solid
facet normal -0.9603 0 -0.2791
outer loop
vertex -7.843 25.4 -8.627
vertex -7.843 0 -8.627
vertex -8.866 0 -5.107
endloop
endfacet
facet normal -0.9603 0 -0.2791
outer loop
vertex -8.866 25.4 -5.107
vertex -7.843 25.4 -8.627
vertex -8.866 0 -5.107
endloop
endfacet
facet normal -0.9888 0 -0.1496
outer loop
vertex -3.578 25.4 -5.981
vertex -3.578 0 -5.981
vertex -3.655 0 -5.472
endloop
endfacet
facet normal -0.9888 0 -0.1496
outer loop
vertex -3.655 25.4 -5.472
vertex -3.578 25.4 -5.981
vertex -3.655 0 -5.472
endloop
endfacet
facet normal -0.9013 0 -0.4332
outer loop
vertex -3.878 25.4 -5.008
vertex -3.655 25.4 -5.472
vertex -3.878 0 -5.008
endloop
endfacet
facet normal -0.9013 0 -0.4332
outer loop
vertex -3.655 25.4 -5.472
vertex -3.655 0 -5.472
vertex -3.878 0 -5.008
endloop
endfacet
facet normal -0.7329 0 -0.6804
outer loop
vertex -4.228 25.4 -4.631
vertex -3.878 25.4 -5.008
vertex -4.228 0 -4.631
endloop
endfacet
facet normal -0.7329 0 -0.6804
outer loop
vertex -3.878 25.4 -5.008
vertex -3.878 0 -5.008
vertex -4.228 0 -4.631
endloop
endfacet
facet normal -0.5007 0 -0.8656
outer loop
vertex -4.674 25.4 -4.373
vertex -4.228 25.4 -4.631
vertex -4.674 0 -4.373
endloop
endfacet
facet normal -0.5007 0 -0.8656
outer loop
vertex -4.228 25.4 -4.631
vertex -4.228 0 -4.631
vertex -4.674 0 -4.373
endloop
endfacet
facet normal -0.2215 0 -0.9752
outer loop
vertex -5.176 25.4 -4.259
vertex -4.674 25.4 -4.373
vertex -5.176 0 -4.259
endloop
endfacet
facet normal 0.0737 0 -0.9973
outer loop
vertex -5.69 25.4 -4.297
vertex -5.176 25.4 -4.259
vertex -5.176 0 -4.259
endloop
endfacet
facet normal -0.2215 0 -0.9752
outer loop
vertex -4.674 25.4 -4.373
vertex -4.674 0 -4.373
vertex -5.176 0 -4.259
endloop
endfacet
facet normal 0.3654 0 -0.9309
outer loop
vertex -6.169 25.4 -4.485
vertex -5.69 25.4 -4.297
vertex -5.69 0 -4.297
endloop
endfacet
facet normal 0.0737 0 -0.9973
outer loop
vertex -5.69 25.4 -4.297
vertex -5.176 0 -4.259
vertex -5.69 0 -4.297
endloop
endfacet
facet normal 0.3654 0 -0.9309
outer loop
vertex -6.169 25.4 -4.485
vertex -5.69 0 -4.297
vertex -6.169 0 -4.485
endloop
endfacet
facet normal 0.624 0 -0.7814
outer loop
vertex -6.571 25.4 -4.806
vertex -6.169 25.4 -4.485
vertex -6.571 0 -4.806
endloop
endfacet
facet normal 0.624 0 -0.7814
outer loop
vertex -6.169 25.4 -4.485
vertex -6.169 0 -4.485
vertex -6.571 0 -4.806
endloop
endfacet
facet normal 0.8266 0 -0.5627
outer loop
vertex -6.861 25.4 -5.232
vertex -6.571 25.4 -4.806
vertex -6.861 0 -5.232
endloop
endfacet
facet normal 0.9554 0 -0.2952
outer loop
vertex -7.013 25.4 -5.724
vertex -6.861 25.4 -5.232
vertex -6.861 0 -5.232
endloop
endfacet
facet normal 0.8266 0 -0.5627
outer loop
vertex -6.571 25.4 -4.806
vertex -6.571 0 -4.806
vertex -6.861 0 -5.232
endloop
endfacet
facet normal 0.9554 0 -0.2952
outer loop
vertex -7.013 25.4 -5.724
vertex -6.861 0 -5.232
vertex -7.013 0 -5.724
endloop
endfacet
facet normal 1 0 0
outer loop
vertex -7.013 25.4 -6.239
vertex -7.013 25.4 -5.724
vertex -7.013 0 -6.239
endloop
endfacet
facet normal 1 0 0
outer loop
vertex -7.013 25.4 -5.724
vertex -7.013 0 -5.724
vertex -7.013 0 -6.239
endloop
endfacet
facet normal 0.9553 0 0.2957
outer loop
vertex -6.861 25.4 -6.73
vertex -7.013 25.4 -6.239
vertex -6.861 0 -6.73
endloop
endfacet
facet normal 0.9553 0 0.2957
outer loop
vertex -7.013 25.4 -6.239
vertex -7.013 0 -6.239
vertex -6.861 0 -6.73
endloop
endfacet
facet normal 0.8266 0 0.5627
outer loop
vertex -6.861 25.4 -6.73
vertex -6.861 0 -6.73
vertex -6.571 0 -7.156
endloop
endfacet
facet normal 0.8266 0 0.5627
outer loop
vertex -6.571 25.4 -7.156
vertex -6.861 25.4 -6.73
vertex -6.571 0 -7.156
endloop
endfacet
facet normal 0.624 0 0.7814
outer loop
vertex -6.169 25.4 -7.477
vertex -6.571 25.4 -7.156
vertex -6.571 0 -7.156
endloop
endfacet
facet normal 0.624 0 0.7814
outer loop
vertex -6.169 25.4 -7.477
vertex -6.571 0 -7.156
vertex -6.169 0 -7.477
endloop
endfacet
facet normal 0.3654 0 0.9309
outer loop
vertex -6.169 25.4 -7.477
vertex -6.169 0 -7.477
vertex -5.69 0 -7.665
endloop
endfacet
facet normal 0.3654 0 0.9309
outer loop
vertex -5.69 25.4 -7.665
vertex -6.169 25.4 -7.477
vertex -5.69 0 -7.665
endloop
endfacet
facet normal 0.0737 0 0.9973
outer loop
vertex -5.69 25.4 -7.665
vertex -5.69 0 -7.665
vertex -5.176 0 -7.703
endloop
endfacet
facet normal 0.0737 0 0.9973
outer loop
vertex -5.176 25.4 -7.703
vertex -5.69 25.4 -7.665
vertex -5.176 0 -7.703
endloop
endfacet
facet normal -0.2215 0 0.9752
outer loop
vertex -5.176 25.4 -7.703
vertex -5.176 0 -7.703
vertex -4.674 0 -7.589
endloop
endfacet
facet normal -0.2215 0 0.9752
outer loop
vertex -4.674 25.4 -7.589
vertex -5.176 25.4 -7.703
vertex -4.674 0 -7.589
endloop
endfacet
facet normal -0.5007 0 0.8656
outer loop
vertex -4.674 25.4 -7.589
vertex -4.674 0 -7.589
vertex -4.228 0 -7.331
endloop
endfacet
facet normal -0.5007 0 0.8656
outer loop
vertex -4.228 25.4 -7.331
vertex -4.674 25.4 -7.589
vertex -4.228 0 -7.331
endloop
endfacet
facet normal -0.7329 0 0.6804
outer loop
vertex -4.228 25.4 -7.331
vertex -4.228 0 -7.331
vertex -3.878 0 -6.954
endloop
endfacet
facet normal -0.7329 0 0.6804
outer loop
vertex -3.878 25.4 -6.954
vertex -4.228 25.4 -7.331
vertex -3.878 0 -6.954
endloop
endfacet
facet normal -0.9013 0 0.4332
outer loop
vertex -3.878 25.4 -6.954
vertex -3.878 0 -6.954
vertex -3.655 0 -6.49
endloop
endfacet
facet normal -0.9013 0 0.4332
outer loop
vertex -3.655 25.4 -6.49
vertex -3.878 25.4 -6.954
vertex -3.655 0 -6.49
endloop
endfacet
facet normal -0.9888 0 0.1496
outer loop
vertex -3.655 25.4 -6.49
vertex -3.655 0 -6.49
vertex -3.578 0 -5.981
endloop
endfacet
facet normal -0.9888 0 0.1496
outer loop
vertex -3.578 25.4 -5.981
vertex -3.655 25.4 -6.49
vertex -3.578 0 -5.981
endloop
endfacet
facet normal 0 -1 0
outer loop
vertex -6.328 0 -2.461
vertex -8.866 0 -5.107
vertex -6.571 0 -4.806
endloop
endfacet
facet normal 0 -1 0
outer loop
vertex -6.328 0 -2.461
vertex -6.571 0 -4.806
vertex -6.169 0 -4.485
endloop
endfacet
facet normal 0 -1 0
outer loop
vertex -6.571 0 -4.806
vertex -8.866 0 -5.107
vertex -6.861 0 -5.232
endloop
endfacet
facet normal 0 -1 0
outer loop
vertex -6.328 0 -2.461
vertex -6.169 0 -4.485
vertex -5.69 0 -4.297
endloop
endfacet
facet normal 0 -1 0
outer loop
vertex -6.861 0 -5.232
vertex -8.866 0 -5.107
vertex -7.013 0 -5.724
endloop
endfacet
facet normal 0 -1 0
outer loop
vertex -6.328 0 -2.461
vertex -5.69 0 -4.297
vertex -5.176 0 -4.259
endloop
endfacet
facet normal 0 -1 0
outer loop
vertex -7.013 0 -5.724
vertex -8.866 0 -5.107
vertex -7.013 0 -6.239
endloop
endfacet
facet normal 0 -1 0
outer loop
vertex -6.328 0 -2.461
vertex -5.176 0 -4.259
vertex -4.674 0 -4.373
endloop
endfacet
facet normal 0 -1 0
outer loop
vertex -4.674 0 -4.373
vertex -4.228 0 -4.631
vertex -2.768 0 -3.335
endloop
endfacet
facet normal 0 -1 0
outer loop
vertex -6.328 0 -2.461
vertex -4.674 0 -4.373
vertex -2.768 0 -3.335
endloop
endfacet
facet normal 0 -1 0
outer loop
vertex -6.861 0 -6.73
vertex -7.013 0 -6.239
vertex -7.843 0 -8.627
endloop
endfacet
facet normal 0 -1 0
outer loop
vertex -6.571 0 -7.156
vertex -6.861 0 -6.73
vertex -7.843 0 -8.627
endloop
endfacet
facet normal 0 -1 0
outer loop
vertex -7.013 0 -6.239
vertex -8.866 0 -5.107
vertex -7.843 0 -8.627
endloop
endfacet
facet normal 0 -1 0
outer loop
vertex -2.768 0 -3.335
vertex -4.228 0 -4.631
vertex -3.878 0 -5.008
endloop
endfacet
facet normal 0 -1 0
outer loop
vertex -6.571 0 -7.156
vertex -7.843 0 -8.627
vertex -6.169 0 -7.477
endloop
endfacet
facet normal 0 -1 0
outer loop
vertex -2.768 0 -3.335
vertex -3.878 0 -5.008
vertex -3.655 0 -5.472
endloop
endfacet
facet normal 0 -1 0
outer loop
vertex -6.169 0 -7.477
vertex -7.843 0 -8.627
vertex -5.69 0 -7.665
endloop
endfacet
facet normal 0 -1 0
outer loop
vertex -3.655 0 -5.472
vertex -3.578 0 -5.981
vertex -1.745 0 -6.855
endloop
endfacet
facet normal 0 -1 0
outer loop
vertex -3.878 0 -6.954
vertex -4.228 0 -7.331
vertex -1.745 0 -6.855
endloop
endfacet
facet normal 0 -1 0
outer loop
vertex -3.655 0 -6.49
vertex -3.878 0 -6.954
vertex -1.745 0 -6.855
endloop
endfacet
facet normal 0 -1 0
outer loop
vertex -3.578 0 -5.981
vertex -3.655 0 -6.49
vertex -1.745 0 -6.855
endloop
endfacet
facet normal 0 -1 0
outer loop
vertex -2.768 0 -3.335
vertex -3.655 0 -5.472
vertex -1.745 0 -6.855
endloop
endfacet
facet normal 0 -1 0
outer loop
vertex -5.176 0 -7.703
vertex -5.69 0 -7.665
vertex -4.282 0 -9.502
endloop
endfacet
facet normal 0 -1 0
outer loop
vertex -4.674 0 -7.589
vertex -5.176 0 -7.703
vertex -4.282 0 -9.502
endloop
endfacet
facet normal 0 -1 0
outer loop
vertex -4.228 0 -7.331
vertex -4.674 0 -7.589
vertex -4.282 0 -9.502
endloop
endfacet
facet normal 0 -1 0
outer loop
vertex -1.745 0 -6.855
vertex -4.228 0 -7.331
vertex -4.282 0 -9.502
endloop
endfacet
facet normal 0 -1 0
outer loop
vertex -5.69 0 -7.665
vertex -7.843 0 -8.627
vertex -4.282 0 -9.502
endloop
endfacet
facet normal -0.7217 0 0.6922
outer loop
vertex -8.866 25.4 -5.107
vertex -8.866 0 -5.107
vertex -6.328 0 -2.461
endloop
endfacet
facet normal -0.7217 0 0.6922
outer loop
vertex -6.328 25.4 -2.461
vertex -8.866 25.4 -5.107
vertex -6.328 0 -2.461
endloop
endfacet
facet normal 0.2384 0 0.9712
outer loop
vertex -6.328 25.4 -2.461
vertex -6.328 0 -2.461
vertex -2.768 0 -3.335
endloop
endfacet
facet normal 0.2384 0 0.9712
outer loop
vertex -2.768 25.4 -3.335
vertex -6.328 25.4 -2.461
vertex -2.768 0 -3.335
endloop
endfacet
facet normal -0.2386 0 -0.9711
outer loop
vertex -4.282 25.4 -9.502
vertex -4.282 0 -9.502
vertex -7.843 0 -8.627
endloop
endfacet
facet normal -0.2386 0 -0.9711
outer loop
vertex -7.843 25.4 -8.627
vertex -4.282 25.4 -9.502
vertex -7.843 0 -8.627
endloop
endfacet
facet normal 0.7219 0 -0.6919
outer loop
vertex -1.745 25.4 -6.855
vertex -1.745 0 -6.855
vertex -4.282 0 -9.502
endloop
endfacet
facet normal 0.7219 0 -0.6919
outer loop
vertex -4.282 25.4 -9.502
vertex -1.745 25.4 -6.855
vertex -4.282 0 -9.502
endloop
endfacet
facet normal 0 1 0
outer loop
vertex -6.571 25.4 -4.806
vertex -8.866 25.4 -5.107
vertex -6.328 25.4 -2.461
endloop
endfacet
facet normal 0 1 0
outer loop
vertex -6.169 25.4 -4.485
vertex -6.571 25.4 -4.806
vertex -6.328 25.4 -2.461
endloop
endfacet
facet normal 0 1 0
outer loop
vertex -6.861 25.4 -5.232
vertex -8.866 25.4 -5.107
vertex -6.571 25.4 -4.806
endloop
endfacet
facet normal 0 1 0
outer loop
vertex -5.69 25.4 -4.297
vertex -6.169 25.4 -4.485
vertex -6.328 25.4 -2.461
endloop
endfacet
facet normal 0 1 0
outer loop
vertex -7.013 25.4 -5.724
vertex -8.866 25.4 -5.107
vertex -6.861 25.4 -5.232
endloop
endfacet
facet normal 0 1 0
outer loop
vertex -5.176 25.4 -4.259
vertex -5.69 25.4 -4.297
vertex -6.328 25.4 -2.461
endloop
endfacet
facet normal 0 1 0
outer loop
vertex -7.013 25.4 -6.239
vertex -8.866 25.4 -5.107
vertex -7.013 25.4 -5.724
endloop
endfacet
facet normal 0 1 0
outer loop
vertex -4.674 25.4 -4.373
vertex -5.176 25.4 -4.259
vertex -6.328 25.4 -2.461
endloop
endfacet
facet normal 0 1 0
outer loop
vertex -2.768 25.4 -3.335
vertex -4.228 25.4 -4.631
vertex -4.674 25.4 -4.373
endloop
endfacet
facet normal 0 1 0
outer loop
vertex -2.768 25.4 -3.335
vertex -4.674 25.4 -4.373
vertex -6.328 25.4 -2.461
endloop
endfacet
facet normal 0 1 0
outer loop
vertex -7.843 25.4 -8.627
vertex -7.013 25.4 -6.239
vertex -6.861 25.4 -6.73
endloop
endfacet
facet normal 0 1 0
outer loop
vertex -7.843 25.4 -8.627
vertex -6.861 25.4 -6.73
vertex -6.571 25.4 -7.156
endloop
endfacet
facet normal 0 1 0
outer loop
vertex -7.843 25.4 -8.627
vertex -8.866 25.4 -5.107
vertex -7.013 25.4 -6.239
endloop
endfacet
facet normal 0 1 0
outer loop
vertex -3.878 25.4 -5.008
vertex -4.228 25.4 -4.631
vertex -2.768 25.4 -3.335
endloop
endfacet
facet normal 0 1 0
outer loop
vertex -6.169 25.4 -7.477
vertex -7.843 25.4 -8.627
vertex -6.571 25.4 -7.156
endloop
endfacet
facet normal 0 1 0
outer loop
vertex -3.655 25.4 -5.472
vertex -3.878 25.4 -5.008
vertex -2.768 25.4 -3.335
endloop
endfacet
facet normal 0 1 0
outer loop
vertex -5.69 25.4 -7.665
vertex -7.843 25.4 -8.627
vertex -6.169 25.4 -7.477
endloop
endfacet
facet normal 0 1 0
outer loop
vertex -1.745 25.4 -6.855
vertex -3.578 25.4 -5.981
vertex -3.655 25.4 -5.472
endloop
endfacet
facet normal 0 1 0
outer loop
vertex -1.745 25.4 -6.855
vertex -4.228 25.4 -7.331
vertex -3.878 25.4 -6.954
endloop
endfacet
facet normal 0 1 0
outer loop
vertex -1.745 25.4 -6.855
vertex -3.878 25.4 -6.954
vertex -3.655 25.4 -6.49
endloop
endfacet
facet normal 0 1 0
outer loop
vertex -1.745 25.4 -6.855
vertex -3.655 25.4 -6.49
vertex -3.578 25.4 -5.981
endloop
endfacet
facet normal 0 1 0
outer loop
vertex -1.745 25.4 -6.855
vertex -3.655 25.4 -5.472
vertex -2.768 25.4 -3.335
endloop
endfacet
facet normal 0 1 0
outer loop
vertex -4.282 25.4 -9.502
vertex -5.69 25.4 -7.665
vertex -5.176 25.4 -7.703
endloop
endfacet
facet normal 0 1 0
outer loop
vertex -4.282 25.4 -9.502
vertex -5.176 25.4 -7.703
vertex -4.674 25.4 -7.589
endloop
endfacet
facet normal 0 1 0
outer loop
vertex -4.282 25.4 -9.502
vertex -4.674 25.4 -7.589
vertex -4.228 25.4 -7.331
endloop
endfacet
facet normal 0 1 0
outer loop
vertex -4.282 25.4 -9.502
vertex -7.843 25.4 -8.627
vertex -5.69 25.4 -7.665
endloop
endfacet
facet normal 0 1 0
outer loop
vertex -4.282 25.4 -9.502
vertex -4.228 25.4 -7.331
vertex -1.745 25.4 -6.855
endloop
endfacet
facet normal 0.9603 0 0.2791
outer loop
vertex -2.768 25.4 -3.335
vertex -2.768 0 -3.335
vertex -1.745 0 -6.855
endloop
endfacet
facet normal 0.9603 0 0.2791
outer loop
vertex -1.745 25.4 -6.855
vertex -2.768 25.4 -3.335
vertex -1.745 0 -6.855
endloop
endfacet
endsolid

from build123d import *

# Parameters (mm, degrees)
BOSS_EXTRUDE1_DEPTH = 25.4
SKETCH3_R           = 1.7272
CUT_EXTRUDE2_DEPTH  = 26.4


with BuildPart() as part:
    # Sketch1 → Boss-Extrude1 (new body)
    with BuildSketch(Plane(origin=(0, 0, 0), x_dir=(1, 0, 0), z_dir=(0, 1, 0))):
        Polygon((-2.767735883, 3.334911674), (-1.744793251, 6.855482892), (-4.282226046, 9.501662807), (-7.842601473, 8.627271504), (-8.865544105, 5.106700285), (-6.32811131, 2.46052037), align=None)
    extrude(amount=BOSS_EXTRUDE1_DEPTH)

    # Sketch3 → Cut-Extrude2 (cut, through all)
    with BuildSketch(Plane.XZ):
        with Locations((-5.305168678, -5.981091589)):
            Circle(SKETCH3_R)
    extrude(amount=-CUT_EXTRUDE2_DEPTH, mode=Mode.SUBTRACT)


solid = part.part
